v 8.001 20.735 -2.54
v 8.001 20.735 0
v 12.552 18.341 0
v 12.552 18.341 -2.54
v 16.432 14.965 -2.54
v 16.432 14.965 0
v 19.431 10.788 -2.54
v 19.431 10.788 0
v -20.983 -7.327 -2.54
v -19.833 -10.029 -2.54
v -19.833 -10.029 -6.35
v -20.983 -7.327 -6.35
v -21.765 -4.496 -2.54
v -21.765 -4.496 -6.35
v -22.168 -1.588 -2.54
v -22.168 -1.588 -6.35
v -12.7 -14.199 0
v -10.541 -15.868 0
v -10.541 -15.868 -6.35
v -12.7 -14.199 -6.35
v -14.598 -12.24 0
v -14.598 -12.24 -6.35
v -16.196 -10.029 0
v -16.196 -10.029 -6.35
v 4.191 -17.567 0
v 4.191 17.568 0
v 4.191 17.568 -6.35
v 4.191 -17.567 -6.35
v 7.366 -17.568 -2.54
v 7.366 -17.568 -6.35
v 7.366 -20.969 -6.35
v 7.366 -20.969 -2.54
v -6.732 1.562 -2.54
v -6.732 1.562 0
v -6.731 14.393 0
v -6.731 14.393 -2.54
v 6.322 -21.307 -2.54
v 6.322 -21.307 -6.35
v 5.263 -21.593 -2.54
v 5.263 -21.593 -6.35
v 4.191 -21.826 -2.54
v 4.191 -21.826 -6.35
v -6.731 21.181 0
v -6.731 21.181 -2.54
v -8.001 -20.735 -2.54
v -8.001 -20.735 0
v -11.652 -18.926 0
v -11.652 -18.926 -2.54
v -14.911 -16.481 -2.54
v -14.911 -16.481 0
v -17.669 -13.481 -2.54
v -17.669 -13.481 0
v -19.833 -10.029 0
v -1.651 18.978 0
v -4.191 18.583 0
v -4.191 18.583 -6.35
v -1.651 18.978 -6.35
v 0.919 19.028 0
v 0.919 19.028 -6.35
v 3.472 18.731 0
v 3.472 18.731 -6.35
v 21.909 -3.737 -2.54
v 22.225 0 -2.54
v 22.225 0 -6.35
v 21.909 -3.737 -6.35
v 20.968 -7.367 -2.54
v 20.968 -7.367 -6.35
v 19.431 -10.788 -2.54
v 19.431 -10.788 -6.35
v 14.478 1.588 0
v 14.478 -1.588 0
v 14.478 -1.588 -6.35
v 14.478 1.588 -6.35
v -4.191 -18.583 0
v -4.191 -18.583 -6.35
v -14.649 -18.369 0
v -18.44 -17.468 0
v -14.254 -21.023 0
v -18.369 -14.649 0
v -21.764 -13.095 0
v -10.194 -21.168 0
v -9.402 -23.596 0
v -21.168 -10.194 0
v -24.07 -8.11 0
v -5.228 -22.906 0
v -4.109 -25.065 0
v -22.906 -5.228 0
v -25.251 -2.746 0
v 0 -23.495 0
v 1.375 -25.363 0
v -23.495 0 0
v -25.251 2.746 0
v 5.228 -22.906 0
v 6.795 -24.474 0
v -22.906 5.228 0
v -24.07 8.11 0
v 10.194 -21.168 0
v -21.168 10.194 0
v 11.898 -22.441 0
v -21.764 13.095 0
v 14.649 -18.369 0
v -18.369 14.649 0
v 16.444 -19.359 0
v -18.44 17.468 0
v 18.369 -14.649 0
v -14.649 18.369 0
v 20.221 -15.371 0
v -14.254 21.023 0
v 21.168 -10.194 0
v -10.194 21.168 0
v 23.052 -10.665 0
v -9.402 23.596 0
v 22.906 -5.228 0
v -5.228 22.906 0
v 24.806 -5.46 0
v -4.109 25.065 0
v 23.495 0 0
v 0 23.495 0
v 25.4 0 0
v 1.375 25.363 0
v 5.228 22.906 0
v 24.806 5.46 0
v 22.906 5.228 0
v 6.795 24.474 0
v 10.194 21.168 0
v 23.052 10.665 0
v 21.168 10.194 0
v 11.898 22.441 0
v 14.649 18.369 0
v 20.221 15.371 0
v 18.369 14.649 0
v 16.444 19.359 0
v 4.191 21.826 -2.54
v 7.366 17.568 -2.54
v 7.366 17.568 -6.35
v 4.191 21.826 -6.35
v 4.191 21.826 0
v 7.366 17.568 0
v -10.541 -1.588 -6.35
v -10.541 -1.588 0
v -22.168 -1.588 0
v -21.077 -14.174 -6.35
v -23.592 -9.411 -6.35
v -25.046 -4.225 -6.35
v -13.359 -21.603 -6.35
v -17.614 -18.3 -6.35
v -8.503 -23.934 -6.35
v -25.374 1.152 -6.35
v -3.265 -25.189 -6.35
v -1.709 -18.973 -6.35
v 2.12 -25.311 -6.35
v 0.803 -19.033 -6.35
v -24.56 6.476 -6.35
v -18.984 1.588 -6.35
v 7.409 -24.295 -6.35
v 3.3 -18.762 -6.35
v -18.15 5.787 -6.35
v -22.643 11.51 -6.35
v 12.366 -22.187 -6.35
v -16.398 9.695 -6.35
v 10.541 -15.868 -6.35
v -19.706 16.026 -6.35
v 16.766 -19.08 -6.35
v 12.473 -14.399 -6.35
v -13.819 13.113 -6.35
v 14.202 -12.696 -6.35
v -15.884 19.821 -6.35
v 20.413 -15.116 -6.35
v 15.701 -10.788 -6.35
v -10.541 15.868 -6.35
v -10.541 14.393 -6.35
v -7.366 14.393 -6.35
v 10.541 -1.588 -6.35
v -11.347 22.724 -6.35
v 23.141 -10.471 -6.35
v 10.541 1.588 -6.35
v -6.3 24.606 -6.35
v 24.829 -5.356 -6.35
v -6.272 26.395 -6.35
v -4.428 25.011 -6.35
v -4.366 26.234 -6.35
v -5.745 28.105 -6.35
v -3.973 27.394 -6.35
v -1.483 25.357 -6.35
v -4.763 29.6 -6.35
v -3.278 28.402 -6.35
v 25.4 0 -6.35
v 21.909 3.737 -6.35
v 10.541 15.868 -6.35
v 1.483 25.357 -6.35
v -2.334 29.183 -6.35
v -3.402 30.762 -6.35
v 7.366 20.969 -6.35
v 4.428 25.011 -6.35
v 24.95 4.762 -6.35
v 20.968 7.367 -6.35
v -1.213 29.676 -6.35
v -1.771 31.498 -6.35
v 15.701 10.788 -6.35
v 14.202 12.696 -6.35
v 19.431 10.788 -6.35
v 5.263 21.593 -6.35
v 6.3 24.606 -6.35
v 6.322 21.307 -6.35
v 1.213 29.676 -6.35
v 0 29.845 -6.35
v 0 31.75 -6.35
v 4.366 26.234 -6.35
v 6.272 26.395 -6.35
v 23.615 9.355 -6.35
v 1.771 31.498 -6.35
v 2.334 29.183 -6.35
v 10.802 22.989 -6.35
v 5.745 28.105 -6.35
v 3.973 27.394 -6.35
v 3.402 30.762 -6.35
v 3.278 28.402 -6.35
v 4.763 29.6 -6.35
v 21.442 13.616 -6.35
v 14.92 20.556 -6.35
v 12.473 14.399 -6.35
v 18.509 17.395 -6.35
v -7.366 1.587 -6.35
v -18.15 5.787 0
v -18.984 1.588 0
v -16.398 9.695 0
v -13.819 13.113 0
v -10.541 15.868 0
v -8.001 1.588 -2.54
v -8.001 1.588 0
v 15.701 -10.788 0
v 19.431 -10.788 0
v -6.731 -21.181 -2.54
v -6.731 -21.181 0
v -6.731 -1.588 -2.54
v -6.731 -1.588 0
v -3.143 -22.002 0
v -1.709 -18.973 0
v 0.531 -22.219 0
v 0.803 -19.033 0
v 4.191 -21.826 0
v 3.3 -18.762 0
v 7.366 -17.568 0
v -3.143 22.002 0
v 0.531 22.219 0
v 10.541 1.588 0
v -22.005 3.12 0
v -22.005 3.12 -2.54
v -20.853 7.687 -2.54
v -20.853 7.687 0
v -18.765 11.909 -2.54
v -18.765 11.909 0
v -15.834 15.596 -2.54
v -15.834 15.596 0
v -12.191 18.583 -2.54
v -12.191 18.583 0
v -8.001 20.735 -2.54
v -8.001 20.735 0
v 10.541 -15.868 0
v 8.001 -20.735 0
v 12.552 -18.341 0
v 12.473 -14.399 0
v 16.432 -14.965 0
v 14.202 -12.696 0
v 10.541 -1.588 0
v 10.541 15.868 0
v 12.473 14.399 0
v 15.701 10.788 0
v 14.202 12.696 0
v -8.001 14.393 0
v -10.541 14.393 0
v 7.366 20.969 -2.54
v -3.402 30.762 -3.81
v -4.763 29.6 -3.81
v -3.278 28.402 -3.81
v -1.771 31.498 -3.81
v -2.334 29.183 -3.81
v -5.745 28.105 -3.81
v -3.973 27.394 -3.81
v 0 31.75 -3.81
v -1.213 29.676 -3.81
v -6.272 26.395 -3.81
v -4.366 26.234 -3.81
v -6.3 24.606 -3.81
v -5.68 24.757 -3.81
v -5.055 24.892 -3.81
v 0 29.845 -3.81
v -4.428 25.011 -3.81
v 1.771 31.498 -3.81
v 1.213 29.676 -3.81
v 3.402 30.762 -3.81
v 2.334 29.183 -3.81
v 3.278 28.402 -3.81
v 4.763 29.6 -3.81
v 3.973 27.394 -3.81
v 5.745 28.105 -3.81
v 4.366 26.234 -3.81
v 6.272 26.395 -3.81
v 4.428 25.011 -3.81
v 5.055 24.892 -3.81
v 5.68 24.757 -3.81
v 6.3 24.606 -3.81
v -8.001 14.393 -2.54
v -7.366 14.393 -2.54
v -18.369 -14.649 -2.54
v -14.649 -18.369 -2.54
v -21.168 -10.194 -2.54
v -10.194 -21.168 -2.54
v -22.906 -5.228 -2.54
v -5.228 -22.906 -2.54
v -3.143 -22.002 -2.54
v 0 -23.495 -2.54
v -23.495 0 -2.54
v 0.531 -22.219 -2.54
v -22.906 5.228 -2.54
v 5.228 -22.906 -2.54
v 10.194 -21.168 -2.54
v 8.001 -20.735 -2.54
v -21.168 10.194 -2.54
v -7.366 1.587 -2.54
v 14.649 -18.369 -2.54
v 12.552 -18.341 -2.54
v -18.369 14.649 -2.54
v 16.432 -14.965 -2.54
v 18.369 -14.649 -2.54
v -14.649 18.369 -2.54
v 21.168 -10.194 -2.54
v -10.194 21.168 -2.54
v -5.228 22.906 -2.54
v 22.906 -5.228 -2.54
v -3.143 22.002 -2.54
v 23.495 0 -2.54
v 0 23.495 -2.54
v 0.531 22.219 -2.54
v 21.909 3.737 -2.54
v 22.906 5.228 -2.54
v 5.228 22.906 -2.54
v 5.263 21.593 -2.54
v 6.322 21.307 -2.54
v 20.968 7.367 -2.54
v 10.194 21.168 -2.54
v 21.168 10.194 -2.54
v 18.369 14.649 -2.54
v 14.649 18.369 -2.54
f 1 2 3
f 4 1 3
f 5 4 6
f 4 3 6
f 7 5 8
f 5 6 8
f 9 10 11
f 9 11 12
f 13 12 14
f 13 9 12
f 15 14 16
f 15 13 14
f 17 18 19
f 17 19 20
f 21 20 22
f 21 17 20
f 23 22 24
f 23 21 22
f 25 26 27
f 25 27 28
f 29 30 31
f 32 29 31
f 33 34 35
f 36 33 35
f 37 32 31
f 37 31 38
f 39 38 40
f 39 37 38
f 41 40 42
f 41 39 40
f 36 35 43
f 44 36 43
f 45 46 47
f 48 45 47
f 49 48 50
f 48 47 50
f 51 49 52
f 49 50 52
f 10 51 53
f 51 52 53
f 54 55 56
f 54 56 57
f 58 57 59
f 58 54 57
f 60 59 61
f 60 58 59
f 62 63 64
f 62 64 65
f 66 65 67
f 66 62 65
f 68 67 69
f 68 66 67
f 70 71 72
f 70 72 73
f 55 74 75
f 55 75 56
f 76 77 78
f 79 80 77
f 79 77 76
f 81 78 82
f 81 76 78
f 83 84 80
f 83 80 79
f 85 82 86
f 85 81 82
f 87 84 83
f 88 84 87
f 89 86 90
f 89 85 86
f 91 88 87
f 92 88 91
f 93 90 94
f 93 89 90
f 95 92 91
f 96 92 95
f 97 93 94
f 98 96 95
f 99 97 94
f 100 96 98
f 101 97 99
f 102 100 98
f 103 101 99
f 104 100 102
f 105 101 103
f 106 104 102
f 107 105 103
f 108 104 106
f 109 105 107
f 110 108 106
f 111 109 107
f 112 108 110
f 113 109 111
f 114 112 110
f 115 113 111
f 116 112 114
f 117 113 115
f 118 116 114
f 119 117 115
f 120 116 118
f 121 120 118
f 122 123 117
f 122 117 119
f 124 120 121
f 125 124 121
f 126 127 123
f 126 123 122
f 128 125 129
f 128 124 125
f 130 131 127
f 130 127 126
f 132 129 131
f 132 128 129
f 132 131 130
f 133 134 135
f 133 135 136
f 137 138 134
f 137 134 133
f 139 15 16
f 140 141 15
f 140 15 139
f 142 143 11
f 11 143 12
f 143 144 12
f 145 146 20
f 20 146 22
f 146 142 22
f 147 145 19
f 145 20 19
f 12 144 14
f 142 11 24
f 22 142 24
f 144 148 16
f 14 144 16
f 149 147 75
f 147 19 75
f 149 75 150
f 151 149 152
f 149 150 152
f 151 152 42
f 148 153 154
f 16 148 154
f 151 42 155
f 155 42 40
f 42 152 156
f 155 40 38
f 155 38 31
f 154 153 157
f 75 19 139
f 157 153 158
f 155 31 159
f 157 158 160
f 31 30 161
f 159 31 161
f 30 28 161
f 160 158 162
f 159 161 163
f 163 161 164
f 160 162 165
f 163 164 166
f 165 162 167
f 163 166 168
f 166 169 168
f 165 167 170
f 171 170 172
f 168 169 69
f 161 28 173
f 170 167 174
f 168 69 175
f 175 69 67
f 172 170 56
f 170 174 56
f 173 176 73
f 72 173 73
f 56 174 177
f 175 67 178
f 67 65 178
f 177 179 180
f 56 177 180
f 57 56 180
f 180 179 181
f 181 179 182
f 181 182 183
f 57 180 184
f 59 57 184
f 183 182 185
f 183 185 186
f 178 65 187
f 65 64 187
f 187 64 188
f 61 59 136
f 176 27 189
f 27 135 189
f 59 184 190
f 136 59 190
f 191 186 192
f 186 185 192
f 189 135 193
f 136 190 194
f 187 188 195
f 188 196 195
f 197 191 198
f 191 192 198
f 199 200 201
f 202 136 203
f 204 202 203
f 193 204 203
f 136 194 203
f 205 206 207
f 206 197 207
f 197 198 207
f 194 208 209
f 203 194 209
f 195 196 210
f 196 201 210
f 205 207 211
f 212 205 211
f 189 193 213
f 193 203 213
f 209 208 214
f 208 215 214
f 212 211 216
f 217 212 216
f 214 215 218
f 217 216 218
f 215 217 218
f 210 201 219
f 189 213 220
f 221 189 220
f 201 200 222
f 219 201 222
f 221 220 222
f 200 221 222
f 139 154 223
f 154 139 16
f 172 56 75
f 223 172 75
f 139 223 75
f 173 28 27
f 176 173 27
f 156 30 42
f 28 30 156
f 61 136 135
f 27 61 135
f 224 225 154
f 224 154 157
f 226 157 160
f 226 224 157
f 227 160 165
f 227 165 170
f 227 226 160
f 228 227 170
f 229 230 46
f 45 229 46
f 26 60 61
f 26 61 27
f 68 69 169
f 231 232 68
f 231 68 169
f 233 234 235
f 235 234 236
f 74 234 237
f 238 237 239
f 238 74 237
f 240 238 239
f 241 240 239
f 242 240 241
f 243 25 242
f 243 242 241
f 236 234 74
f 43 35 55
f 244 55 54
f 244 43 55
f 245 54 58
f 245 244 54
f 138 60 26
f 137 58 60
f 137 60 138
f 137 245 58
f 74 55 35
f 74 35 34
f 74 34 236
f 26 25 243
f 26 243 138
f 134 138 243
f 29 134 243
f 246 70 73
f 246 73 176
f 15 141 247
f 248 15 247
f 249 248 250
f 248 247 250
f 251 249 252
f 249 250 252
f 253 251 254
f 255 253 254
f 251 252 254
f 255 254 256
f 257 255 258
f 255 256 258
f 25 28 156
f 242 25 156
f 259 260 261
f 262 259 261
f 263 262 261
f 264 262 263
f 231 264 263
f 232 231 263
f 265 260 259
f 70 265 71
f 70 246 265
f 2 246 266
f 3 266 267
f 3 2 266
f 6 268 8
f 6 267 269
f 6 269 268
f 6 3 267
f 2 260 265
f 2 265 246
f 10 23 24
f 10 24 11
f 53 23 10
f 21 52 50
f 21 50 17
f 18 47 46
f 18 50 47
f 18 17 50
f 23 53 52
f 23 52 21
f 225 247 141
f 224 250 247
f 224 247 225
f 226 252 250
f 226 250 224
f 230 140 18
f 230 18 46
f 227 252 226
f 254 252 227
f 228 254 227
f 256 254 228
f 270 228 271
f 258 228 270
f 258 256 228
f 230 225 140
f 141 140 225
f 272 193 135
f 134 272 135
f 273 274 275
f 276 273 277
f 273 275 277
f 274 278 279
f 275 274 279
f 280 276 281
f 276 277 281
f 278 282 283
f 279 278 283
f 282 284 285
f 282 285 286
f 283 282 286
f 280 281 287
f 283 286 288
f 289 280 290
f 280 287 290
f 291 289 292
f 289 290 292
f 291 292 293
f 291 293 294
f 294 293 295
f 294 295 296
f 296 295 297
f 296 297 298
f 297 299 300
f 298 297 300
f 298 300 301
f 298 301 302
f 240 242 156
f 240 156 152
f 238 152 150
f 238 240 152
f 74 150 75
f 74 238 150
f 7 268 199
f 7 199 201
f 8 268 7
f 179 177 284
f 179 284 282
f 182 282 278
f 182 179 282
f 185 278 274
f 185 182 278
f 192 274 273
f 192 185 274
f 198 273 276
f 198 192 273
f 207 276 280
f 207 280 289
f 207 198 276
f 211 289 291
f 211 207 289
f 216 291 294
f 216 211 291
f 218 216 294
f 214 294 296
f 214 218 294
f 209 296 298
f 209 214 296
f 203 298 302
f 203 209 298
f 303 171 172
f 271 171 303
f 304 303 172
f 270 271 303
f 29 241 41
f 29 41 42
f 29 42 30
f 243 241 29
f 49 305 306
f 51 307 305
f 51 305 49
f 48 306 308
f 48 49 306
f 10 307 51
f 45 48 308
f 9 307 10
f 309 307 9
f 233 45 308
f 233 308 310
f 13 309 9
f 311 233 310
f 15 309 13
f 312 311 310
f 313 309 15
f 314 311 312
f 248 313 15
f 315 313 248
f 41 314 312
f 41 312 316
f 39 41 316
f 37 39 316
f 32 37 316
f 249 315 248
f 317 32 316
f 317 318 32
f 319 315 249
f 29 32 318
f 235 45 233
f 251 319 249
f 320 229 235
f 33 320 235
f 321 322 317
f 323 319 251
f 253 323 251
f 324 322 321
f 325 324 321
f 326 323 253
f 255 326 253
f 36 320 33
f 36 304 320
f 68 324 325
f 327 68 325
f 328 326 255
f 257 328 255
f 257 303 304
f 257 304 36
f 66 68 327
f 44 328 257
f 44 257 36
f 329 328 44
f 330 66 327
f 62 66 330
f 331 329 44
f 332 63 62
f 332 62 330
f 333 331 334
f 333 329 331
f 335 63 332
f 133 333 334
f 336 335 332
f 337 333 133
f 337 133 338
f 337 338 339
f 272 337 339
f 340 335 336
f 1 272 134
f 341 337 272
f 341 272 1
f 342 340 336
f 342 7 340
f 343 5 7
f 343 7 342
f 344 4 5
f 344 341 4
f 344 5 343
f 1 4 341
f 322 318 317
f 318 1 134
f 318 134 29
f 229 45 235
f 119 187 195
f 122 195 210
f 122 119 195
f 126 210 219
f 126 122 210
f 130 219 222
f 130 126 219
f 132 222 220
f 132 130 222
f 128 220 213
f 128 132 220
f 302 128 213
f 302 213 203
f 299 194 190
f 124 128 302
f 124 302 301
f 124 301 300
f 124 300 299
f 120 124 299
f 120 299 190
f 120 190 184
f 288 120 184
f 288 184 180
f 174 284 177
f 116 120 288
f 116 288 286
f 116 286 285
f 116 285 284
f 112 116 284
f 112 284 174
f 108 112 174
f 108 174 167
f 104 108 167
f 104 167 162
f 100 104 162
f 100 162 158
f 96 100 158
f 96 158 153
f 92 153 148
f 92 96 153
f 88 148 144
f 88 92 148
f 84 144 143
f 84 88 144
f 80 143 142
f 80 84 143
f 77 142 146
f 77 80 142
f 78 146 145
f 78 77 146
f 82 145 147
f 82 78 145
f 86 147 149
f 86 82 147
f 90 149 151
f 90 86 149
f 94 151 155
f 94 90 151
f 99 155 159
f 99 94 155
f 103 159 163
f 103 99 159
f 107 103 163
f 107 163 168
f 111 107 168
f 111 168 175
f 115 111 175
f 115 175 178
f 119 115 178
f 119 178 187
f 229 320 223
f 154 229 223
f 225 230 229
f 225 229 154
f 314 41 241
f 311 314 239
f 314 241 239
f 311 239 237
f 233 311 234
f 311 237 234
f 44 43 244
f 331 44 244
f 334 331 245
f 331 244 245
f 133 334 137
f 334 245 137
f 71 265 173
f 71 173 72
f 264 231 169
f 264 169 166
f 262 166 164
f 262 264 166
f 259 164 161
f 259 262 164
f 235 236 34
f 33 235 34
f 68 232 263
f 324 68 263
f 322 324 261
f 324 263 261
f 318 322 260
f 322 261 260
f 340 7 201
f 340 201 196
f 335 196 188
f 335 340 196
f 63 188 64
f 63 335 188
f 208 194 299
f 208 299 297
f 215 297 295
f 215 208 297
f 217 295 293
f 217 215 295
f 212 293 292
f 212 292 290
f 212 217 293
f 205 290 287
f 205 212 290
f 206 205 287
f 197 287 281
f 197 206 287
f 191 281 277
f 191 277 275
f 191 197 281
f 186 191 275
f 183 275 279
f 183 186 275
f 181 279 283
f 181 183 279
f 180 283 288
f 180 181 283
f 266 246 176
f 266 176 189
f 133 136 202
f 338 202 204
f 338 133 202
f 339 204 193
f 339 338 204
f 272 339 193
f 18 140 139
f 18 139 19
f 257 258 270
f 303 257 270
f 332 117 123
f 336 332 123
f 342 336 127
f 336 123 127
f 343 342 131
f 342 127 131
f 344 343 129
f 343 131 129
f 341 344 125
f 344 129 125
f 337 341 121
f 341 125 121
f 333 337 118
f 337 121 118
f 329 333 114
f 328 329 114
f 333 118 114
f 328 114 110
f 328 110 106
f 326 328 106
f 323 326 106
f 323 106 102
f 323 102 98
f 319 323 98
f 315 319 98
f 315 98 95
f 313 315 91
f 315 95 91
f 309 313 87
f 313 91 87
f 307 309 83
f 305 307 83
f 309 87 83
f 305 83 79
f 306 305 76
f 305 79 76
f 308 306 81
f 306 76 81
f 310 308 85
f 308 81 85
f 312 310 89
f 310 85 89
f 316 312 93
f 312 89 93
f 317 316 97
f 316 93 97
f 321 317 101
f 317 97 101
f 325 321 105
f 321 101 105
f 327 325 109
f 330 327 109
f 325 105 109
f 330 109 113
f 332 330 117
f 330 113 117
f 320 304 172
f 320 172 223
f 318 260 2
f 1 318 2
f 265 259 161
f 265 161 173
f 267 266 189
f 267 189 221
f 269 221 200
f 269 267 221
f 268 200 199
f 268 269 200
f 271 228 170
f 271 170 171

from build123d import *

# Parameters (mm, degrees)
F0_R     = 25.4
F0_R_2   = 23.495
F1_DEPTH = 6.35
F2_DEPTH = 2.54
F4_DEPTH = 2.54


with BuildPart() as f1:
    # F0 (on Top) → F1 (new body)
    with BuildSketch(Plane.XY):
        Circle(F0_R)
        Circle(F0_R_2, mode=Mode.SUBTRACT)
        Circle(F0_R_2)
        with BuildLine():
            ThreePointArc((19.4312153991, 10.7878864062), (21.5152200459, 5.5718875955), (22.225, 0))
            ThreePointArc((22.225, 0), (21.5152200459, -5.5718875955), (19.4312153991, -10.7878864062))
            ThreePointArc((19.4312153991, -10.7878864062), (14.5899693593, -16.7655426126), (8.001, -20.7348649381))
            ThreePointArc((8.001, -20.7348649381), (7.6843906394, -20.8542745139), (7.366, -20.9688499685))
            ThreePointArc((7.366, -20.9688499685), (5.7943813589, -21.4563689768), (4.191, -21.8262718759))
            ThreePointArc((4.191, -21.8262718759), (-1.3103135445, -22.1863404692), (-6.731, -21.1812243272))
            ThreePointArc((-6.731, -21.1812243272), (-7.3693802437, -20.9676622403), (-8.001, -20.7348649381))
            ThreePointArc((-8.001, -20.7348649381), (-14.9111451119, -16.480545393), (-19.833461849, -10.0291782357))
            ThreePointArc((-19.833461849, -10.0291782357), (-21.420808455, -5.9244907069), (-22.1682310695, -1.5875))
            ThreePointArc((-22.1682310695, -1.5875), (-18.7647973594, 11.9093662746), (-8.001, 20.7348649381))
            ThreePointArc((-8.001, 20.7348649381), (-7.3693802437, 20.9676622403), (-6.731, 21.1812243272))
            ThreePointArc((-6.731, 21.1812243272), (-1.3103135445, 22.1863404692), (4.191, 21.8262718759))
            ThreePointArc((4.191, 21.8262718759), (5.7943813589, 21.4563689768), (7.366, 20.9688499685))
            ThreePointArc((7.366, 20.9688499685), (7.6843906394, 20.8542745139), (8.001, 20.7348649381))
            ThreePointArc((8.001, 20.7348649381), (14.5899693593, 16.7655426126), (19.4312153991, 10.7878864062))
        make_face(mode=Mode.SUBTRACT)
        with BuildLine():
            Line((7.366, 17.5682823292), (4.191, 21.8262718759))
            ThreePointArc((4.191, 21.8262718759), (-1.3103135445, 22.1863404692), (-6.731, 21.1812243272))
            Line((-6.731, 21.1812243272), (-6.731, 14.3932823292))
            Line((-6.731, 14.3932823292), (-6.7315069765, 1.5621306643))
            Line((-6.7315069765, 1.5621306643), (-6.731, -1.5875))
            Line((-6.731, -1.5875), (-6.731, -21.1812243272))
            ThreePointArc((-6.731, -21.1812243272), (-1.3103135445, -22.1863404692), (4.191, -21.8262718759))
            Line((4.191, -21.8262718759), (7.366, -17.5682823292))
            Line((7.366, -17.5682823292), (7.366, -1.5875))
            Line((7.366, -1.5875), (7.366, 1.5875))
            Line((7.366, 1.5875), (7.366, 17.5682823292))
        make_face()
        with BuildLine():
            Line((-4.191, 1.5875), (-4.191, 18.5832725589))
            ThreePointArc((-4.191, 18.5832725589), (-0.3670330457, 19.0464638908), (3.4719400554, 18.7309405063))
            Line((3.4719400554, 18.7309405063), (4.191, 17.5682823292))
            Line((4.191, 17.5682823292), (4.191, -17.5672725589))
            Line((4.191, -17.5672725589), (3.3001679253, -18.7619666257))
            ThreePointArc((3.3001679253, -18.7619666257), (-0.4542888274, -19.0445824754), (-4.191, -18.5832725589))
            Line((-4.191, -18.5832725589), (-4.191, -1.5875))
            Line((-4.191, -1.5875), (-4.191, 1.5875))
        make_face(mode=Mode.SUBTRACT)
        with BuildLine():
            Line((-8.001, 14.3932823292), (-8.001, 20.7348649381))
            ThreePointArc((-8.001, 20.7348649381), (-18.7647973594, 11.9093662746), (-22.1682310695, -1.5875))
            Line((-22.1682310695, -1.5875), (-18.9837389297, -1.5875))
            Line((-18.9837389297, -1.5875), (-10.541, -1.5875))
            Line((-10.541, -1.5875), (-10.541, -15.8678864062))
            ThreePointArc((-10.541, -15.8678864062), (-13.6836612477, -13.2536755226), (-16.1962367208, -10.0291782357))
            Line((-16.1962367208, -10.0291782357), (-19.833461849, -10.0291782357))
            ThreePointArc((-19.833461849, -10.0291782357), (-14.9111451119, -16.480545393), (-8.001, -20.7348649381))
            Line((-8.001, -20.7348649381), (-8.001, -1.5875))
            Line((-8.001, -1.5875), (-8.001, 1.5875))
            Line((-8.001, 1.5875), (-18.9837389297, 1.5875))
            ThreePointArc((-18.9837389297, 1.5875), (-16.3984728311, 9.6949775042), (-10.541, 15.8678864062))
            Line((-10.541, 15.8678864062), (-10.541, 14.3932823292))
            Line((-10.541, 14.3932823292), (-8.001, 14.3932823292))
        make_face()
        with BuildLine():
            Line((15.7010829845, 10.7878864062), (19.4312153991, 10.7878864062))
            ThreePointArc((19.4312153991, 10.7878864062), (14.5899693593, 16.7655426126), (8.001, 20.7348649381))
            Line((8.001, 20.7348649381), (8.001, -20.7348649381))
            ThreePointArc((8.001, -20.7348649381), (14.5899693593, -16.7655426126), (19.4312153991, -10.7878864062))
            Line((19.4312153991, -10.7878864062), (15.7010829845, -10.7878864062))
            ThreePointArc((15.7010829845, -10.7878864062), (13.3646298056, -13.5753147351), (10.541, -15.8678864062))
            Line((10.541, -15.8678864062), (10.541, -1.5875))
            Line((10.541, -1.5875), (14.478, -1.5875))
            Line((14.478, -1.5875), (14.478, 1.5875))
            Line((14.478, 1.5875), (10.541, 1.5875))
            Line((10.541, 1.5875), (10.541, 15.8678864062))
            ThreePointArc((10.541, 15.8678864062), (13.3646298056, 13.5753147351), (15.7010829845, 10.7878864062))
        make_face()
        with BuildLine():
            Line((8.001, -20.7348649381), (8.001, 20.7348649381))
            ThreePointArc((8.001, 20.7348649381), (7.6843906394, 20.8542745139), (7.366, 20.9688499685))
            Line((7.366, 20.9688499685), (7.366, 17.5682823292))
            Line((7.366, 17.5682823292), (7.366, 1.5875))
            Line((7.366, 1.5875), (7.366, -1.5875))
            Line((7.366, -1.5875), (7.366, -17.5682823292))
            Line((7.366, -17.5682823292), (7.366, -20.9688499685))
            ThreePointArc((7.366, -20.9688499685), (7.6843906394, -20.8542745139), (8.001, -20.7348649381))
        make_face()
        with BuildLine():
            ThreePointArc((-8.001, -20.7348649381), (-7.3693802437, -20.9676622403), (-6.731, -21.1812243272))
            Line((-6.731, -21.1812243272), (-6.731, -1.5875))
            Line((-6.731, -1.5875), (-7.366, -1.5875))
            Line((-7.366, -1.5875), (-8.001, -1.5875))
            Line((-8.001, -1.5875), (-8.001, -20.7348649381))
        make_face()
        with BuildLine():
            Line((-6.731, 14.3932823292), (-6.731, 21.1812243272))
            ThreePointArc((-6.731, 21.1812243272), (-7.3693802437, 20.9676622403), (-8.001, 20.7348649381))
            Line((-8.001, 20.7348649381), (-8.001, 14.3932823292))
            Line((-8.001, 14.3932823292), (-7.366, 14.3932823292))
            Line((-7.366, 14.3932823292), (-6.731, 14.3932823292))
        make_face()
        Polygon((-6.7315069765, 1.5621306643), (-6.731, 14.3932823292), (-7.366, 14.3932823292), (-7.366, 1.5875), align=None)
        Polygon((-7.366, -1.5875), (-6.731, -1.5875), (-6.7315069765, 1.5621306643), (-7.366, 1.5875), (-8.001, 1.5875), (-8.001, -1.5875), align=None)
    extrude(amount=-F1_DEPTH)

    # F0 (on Top) → F2 (cut)
    with BuildSketch(Plane.XY):
        Circle(F0_R_2)
        with BuildLine():
            ThreePointArc((19.4312153991, 10.7878864062), (21.5152200459, 5.5718875955), (22.225, 0))
            ThreePointArc((22.225, 0), (21.5152200459, -5.5718875955), (19.4312153991, -10.7878864062))
            ThreePointArc((19.4312153991, -10.7878864062), (14.5899693593, -16.7655426126), (8.001, -20.7348649381))
            ThreePointArc((8.001, -20.7348649381), (7.6843906394, -20.8542745139), (7.366, -20.9688499685))
            ThreePointArc((7.366, -20.9688499685), (5.7943813589, -21.4563689768), (4.191, -21.8262718759))
            ThreePointArc((4.191, -21.8262718759), (-1.3103135445, -22.1863404692), (-6.731, -21.1812243272))
            ThreePointArc((-6.731, -21.1812243272), (-7.3693802437, -20.9676622403), (-8.001, -20.7348649381))
            ThreePointArc((-8.001, -20.7348649381), (-14.9111451119, -16.480545393), (-19.833461849, -10.0291782357))
            ThreePointArc((-19.833461849, -10.0291782357), (-21.420808455, -5.9244907069), (-22.1682310695, -1.5875))
            ThreePointArc((-22.1682310695, -1.5875), (-18.7647973594, 11.9093662746), (-8.001, 20.7348649381))
            ThreePointArc((-8.001, 20.7348649381), (-7.3693802437, 20.9676622403), (-6.731, 21.1812243272))
            ThreePointArc((-6.731, 21.1812243272), (-1.3103135445, 22.1863404692), (4.191, 21.8262718759))
            ThreePointArc((4.191, 21.8262718759), (5.7943813589, 21.4563689768), (7.366, 20.9688499685))
            ThreePointArc((7.366, 20.9688499685), (7.6843906394, 20.8542745139), (8.001, 20.7348649381))
            ThreePointArc((8.001, 20.7348649381), (14.5899693593, 16.7655426126), (19.4312153991, 10.7878864062))
        make_face(mode=Mode.SUBTRACT)
        with BuildLine():
            Line((-6.731, 14.3932823292), (-6.731, 21.1812243272))
            ThreePointArc((-6.731, 21.1812243272), (-7.3693802437, 20.9676622403), (-8.001, 20.7348649381))
            Line((-8.001, 20.7348649381), (-8.001, 14.3932823292))
            Line((-8.001, 14.3932823292), (-7.366, 14.3932823292))
            Line((-7.366, 14.3932823292), (-6.731, 14.3932823292))
        make_face()
        Polygon((-6.7315069765, 1.5621306643), (-6.731, 14.3932823292), (-7.366, 14.3932823292), (-7.366, 1.5875), align=None)
        Polygon((-7.366, -1.5875), (-6.731, -1.5875), (-6.7315069765, 1.5621306643), (-7.366, 1.5875), (-8.001, 1.5875), (-8.001, -1.5875), align=None)
        with BuildLine():
            ThreePointArc((-8.001, -20.7348649381), (-7.3693802437, -20.9676622403), (-6.731, -21.1812243272))
            Line((-6.731, -21.1812243272), (-6.731, -1.5875))
            Line((-6.731, -1.5875), (-7.366, -1.5875))
            Line((-7.366, -1.5875), (-8.001, -1.5875))
            Line((-8.001, -1.5875), (-8.001, -20.7348649381))
        make_face()
        with BuildLine():
            Line((8.001, -20.7348649381), (8.001, 20.7348649381))
            ThreePointArc((8.001, 20.7348649381), (7.6843906394, 20.8542745139), (7.366, 20.9688499685))
            Line((7.366, 20.9688499685), (7.366, 17.5682823292))
            Line((7.366, 17.5682823292), (7.366, 1.5875))
            Line((7.366, 1.5875), (7.366, -1.5875))
            Line((7.366, -1.5875), (7.366, -17.5682823292))
            Line((7.366, -17.5682823292), (7.366, -20.9688499685))
            ThreePointArc((7.366, -20.9688499685), (7.6843906394, -20.8542745139), (8.001, -20.7348649381))
        make_face()
    extrude(amount=-F2_DEPTH, mode=Mode.SUBTRACT)

    # F3 (on face) → F4 (join)
    with BuildSketch(Plane(origin=(0, 0, -6.35), x_dir=(1, 0, 0), z_dir=(0, 0, -1))):
        with BuildLine():
            ThreePointArc((-4.4279512894, -25.0110625), (-5.3678907079, -24.826311634), (-6.3001953095, -24.60625))
            ThreePointArc((-6.3001953095, -24.60625), (0, -31.75), (6.3001953095, -24.60625))
            ThreePointArc((6.3001953095, -24.60625), (5.3678907079, -24.826311634), (4.4279512894, -25.0110625))
            ThreePointArc((4.4279512894, -25.0110625), (0, -29.845), (-4.4279512894, -25.0110625))
        make_face()
    extrude(amount=-F4_DEPTH)


solid = f1.part
